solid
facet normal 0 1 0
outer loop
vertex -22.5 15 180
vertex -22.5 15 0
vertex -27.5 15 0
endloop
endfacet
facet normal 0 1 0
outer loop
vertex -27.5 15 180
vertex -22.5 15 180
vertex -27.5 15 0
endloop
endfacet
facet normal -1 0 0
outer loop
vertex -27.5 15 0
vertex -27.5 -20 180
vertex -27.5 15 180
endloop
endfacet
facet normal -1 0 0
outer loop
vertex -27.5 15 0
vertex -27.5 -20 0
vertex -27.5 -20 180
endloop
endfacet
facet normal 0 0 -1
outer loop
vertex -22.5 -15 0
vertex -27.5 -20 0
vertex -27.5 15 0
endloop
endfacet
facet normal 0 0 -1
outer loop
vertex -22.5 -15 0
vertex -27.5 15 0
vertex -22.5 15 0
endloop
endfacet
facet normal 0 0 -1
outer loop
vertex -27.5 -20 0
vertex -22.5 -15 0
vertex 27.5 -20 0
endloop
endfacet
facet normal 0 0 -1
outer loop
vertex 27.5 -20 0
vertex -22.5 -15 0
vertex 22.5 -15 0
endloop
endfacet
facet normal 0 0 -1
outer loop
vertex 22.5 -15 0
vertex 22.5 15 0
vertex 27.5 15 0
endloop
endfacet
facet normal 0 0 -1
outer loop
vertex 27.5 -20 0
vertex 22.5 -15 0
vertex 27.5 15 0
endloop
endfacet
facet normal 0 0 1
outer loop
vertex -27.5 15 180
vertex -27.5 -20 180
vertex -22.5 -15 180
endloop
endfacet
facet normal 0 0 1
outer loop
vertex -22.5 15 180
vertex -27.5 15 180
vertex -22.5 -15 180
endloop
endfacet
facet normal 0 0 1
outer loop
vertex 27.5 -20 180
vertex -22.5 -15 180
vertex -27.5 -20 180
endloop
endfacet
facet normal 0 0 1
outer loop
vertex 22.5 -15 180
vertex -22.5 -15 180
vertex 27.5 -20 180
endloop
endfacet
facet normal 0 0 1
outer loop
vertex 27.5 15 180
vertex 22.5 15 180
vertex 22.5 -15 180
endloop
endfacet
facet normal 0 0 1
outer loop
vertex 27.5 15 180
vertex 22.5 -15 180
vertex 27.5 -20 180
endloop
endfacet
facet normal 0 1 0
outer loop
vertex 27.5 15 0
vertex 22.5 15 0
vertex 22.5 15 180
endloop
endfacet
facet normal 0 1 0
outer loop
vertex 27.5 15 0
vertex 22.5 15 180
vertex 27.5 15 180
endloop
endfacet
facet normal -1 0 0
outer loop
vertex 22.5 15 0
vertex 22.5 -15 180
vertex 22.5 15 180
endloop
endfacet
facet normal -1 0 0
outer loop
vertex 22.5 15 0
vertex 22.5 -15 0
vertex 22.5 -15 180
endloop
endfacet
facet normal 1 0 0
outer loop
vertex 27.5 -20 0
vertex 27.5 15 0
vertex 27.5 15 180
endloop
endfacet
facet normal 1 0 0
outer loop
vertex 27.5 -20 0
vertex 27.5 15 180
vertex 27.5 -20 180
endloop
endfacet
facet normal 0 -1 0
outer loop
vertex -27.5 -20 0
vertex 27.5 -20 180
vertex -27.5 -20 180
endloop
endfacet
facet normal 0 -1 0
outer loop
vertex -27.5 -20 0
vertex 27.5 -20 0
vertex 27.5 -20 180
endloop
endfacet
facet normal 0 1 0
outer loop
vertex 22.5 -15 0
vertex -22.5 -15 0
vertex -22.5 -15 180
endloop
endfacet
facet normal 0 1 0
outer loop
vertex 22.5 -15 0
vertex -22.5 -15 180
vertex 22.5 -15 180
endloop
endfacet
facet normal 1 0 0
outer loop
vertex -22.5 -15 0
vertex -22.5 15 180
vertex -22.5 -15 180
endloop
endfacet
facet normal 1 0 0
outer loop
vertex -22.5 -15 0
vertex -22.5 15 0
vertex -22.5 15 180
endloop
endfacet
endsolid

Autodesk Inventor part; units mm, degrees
ref_plane "YZ Plane" through (0, 0, 0) normal (1, 0, 0) x (0, 1, 0)
ref_plane "XZ Plane" through (0, 0, 0) normal (0, 1, 0) x (-1, 0, 0)
ref_plane "XY Plane" through (0, 0, 0) normal (0, 0, 1) x (1, 0, 0)
sketch "Sketch1" plane through (0, 0, 0) normal (0, 0, 1) x (1, 0, 0)
  line L0 (22.5, 15) -> (-22.5, 15) construction
  line L1 (-22.5, 15) -> (-22.5, -15)
  line L2 (-22.5, -15) -> (22.5, -15)
  line L3 (22.5, -15) -> (22.5, 15)
  line L4 (22.5, 15) -> (-22.5, -15) construction
  line L5 (-22.5, 15) -> (22.5, -15) construction
  line L6 (-27.5, -20) -> (-27.5, 15)
  line L7 (-27.5, 20) -> (27.5, 20) construction
  line L8 (27.5, 20) -> (27.5, 15) construction
  line L9 (27.5, -20) -> (-27.5, -20)
  line L10 (-22.5, 15) -> (-27.5, 15)
  line L11 (22.5, 15) -> (27.5, 15)
  line L12 (-27.5, 15) -> (-27.5, 20) construction
  line L13 (27.5, 15) -> (27.5, -20)
  point P0 (0, 0)
  dimension "d0" = 45
  dimension "d1" = 30
  dimension "d2" = 5
  dimension "d3" = 5
  dimension "d4" = 5
  dimension "d5" = 40
extrude "Extrusion1" add sketch "Sketch1" along normal blind 180
properties part number "track z2053"
